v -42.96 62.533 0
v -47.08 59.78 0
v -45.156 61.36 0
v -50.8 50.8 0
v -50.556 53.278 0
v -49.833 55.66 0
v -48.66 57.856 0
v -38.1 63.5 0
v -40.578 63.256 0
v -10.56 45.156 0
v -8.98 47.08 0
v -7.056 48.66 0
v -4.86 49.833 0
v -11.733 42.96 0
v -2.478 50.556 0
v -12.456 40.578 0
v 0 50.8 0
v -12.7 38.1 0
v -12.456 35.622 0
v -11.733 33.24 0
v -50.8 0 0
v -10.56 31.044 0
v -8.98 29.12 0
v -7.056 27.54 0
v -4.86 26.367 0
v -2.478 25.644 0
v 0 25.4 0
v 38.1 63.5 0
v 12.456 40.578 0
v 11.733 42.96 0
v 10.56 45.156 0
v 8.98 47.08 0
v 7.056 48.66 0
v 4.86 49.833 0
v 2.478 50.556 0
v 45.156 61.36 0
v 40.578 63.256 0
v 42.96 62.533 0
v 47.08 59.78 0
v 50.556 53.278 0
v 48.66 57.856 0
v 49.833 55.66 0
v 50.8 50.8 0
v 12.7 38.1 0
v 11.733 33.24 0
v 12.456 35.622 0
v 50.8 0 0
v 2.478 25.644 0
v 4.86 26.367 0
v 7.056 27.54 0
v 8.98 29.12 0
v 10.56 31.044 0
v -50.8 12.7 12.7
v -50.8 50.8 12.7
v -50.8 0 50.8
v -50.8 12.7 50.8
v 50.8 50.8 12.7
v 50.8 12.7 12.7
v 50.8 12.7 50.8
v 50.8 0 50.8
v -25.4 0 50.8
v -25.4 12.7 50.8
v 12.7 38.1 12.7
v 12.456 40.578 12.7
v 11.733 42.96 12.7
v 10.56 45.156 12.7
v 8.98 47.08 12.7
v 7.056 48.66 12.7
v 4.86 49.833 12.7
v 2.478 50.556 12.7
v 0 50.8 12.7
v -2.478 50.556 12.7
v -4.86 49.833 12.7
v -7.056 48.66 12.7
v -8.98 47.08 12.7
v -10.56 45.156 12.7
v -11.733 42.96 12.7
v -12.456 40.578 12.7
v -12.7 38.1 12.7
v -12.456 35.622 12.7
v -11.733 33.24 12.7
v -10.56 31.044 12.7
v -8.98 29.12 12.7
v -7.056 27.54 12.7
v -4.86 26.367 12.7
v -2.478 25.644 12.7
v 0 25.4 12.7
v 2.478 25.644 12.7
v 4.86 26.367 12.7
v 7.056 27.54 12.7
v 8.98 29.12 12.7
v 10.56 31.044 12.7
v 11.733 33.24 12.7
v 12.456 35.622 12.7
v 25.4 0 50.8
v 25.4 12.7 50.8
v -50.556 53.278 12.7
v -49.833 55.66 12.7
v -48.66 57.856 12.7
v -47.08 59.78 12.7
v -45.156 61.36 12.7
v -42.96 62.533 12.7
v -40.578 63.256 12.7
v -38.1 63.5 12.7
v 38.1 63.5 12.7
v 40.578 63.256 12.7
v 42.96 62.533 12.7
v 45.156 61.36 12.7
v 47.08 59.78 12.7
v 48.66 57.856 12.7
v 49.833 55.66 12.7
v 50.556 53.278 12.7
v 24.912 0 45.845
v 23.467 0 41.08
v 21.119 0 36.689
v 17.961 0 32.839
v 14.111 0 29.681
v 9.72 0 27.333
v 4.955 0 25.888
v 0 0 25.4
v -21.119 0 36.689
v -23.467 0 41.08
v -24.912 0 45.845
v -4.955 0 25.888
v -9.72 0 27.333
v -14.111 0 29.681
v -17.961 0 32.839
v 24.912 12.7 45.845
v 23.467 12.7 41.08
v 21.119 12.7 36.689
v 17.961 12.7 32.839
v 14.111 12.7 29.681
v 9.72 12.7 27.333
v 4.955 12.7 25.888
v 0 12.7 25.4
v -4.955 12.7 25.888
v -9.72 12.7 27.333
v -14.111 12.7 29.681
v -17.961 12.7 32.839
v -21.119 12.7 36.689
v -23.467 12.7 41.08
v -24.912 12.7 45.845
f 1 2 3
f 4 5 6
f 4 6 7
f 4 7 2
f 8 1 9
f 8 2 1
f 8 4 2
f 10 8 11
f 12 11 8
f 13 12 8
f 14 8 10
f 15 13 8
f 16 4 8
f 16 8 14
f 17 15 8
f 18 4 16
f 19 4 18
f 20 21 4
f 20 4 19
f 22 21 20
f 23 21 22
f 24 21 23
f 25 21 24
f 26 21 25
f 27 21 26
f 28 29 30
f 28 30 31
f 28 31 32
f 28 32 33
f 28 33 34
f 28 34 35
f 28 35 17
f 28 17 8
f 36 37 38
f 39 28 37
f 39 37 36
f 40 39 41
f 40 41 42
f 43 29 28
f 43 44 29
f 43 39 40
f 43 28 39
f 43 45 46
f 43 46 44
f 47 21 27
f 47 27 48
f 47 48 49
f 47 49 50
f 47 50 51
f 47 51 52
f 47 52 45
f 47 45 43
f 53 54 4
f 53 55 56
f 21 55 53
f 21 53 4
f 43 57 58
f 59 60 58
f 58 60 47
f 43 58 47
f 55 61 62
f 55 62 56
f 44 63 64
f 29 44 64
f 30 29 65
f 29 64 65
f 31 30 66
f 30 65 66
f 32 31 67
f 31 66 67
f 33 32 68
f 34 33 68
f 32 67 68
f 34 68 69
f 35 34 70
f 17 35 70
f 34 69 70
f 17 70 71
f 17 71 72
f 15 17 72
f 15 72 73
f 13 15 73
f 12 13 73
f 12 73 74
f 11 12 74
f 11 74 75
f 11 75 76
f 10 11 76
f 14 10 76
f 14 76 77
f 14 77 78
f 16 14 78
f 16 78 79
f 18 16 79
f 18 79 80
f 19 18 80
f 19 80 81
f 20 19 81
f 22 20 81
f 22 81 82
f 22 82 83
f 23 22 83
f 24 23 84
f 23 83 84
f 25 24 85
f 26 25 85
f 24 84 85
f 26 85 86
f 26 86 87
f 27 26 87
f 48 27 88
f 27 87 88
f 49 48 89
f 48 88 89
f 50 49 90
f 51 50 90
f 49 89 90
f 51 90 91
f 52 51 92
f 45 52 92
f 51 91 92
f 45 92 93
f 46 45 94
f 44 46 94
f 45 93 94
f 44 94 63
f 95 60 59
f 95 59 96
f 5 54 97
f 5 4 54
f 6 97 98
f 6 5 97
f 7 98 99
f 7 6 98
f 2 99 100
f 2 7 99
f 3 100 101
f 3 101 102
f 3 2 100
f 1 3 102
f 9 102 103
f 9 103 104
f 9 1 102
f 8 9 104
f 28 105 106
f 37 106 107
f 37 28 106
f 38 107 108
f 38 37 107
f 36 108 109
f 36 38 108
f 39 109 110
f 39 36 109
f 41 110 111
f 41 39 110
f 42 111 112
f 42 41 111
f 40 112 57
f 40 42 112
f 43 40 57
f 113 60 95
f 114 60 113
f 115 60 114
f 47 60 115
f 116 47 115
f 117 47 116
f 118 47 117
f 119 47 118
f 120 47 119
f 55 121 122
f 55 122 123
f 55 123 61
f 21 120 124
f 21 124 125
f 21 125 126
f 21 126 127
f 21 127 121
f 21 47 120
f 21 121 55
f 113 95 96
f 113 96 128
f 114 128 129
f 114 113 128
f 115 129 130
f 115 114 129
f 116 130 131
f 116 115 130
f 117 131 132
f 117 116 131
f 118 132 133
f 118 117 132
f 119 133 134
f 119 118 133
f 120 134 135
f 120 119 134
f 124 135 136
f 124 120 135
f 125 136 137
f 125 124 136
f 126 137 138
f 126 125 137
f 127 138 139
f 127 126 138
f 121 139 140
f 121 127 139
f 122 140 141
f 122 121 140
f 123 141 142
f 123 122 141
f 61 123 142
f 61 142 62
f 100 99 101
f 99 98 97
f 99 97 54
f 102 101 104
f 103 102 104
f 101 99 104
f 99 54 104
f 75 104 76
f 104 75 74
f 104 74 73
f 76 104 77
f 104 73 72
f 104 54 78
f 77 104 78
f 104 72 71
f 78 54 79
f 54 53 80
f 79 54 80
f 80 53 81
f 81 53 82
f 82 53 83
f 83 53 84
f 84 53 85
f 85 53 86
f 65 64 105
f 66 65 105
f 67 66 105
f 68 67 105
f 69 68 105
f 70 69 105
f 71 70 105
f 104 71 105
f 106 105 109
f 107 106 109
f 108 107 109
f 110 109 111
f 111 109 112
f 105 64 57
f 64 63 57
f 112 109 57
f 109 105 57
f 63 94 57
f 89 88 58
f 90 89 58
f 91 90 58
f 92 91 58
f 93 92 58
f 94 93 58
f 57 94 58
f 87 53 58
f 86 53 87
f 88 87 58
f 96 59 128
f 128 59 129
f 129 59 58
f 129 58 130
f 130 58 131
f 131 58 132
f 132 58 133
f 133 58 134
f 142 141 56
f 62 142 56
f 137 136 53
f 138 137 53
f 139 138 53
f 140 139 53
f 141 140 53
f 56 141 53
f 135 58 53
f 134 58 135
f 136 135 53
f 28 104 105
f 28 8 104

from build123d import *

# Parameters (mm, degrees)
BOSS_EXTRUDE1_DEPTH = 12.7
SKETCH2_W           = 101.6
SKETCH2_H           = 12.7
BOSS_EXTRUDE2_DEPTH = 50.8
SKETCH3_R           = 12.7
CUT_EXTRUDE1_DEPTH  = 13.7
FILLET2_R           = 12.7


with BuildPart() as part:
    # Sketch1 → Boss-Extrude1 (new body)
    with BuildSketch(Plane(origin=(0, 0, 0), x_dir=(1, 0, 0), z_dir=(0, 1, 0))):
        with BuildLine():
            Line((-50.8, -50.8), (-50.8, 0))
            Line((-50.8, 0), (50.8, 0))
            Line((50.8, 0), (50.8, -50.8))
            Line((50.8, -50.8), (25.4, -50.8))
            ThreePointArc((25.4, -50.8), (0, -25.4), (-25.4, -50.8))
            Line((-25.4, -50.8), (-50.8, -50.8))
        make_face()
    extrude(amount=BOSS_EXTRUDE1_DEPTH)

    # Sketch2 → Boss-Extrude2 (add)
    with BuildSketch(Plane(origin=(0, 12.7, 0), x_dir=(1, 0, 0), z_dir=(0, 1, 0))):
        with Locations((0, -6.35)):
            Rectangle(SKETCH2_W, SKETCH2_H)
    extrude(amount=BOSS_EXTRUDE2_DEPTH)

    # Sketch3 → Cut-Extrude1 (cut, through all)
    with BuildSketch(Plane.XY.offset(12.7)):
        with Locations((0, 38.1)):
            Circle(SKETCH3_R)
    extrude(amount=-CUT_EXTRUDE1_DEPTH, mode=Mode.SUBTRACT)

    # Fillet2
    fillet2_edges = [part.edges().sort_by_distance(p)[0] for p in [
        (-50.8, 63.5, 6.35),
        (50.8, 63.5, 6.35),
    ]]
    fillet(fillet2_edges, radius=FILLET2_R)


solid = part.part
